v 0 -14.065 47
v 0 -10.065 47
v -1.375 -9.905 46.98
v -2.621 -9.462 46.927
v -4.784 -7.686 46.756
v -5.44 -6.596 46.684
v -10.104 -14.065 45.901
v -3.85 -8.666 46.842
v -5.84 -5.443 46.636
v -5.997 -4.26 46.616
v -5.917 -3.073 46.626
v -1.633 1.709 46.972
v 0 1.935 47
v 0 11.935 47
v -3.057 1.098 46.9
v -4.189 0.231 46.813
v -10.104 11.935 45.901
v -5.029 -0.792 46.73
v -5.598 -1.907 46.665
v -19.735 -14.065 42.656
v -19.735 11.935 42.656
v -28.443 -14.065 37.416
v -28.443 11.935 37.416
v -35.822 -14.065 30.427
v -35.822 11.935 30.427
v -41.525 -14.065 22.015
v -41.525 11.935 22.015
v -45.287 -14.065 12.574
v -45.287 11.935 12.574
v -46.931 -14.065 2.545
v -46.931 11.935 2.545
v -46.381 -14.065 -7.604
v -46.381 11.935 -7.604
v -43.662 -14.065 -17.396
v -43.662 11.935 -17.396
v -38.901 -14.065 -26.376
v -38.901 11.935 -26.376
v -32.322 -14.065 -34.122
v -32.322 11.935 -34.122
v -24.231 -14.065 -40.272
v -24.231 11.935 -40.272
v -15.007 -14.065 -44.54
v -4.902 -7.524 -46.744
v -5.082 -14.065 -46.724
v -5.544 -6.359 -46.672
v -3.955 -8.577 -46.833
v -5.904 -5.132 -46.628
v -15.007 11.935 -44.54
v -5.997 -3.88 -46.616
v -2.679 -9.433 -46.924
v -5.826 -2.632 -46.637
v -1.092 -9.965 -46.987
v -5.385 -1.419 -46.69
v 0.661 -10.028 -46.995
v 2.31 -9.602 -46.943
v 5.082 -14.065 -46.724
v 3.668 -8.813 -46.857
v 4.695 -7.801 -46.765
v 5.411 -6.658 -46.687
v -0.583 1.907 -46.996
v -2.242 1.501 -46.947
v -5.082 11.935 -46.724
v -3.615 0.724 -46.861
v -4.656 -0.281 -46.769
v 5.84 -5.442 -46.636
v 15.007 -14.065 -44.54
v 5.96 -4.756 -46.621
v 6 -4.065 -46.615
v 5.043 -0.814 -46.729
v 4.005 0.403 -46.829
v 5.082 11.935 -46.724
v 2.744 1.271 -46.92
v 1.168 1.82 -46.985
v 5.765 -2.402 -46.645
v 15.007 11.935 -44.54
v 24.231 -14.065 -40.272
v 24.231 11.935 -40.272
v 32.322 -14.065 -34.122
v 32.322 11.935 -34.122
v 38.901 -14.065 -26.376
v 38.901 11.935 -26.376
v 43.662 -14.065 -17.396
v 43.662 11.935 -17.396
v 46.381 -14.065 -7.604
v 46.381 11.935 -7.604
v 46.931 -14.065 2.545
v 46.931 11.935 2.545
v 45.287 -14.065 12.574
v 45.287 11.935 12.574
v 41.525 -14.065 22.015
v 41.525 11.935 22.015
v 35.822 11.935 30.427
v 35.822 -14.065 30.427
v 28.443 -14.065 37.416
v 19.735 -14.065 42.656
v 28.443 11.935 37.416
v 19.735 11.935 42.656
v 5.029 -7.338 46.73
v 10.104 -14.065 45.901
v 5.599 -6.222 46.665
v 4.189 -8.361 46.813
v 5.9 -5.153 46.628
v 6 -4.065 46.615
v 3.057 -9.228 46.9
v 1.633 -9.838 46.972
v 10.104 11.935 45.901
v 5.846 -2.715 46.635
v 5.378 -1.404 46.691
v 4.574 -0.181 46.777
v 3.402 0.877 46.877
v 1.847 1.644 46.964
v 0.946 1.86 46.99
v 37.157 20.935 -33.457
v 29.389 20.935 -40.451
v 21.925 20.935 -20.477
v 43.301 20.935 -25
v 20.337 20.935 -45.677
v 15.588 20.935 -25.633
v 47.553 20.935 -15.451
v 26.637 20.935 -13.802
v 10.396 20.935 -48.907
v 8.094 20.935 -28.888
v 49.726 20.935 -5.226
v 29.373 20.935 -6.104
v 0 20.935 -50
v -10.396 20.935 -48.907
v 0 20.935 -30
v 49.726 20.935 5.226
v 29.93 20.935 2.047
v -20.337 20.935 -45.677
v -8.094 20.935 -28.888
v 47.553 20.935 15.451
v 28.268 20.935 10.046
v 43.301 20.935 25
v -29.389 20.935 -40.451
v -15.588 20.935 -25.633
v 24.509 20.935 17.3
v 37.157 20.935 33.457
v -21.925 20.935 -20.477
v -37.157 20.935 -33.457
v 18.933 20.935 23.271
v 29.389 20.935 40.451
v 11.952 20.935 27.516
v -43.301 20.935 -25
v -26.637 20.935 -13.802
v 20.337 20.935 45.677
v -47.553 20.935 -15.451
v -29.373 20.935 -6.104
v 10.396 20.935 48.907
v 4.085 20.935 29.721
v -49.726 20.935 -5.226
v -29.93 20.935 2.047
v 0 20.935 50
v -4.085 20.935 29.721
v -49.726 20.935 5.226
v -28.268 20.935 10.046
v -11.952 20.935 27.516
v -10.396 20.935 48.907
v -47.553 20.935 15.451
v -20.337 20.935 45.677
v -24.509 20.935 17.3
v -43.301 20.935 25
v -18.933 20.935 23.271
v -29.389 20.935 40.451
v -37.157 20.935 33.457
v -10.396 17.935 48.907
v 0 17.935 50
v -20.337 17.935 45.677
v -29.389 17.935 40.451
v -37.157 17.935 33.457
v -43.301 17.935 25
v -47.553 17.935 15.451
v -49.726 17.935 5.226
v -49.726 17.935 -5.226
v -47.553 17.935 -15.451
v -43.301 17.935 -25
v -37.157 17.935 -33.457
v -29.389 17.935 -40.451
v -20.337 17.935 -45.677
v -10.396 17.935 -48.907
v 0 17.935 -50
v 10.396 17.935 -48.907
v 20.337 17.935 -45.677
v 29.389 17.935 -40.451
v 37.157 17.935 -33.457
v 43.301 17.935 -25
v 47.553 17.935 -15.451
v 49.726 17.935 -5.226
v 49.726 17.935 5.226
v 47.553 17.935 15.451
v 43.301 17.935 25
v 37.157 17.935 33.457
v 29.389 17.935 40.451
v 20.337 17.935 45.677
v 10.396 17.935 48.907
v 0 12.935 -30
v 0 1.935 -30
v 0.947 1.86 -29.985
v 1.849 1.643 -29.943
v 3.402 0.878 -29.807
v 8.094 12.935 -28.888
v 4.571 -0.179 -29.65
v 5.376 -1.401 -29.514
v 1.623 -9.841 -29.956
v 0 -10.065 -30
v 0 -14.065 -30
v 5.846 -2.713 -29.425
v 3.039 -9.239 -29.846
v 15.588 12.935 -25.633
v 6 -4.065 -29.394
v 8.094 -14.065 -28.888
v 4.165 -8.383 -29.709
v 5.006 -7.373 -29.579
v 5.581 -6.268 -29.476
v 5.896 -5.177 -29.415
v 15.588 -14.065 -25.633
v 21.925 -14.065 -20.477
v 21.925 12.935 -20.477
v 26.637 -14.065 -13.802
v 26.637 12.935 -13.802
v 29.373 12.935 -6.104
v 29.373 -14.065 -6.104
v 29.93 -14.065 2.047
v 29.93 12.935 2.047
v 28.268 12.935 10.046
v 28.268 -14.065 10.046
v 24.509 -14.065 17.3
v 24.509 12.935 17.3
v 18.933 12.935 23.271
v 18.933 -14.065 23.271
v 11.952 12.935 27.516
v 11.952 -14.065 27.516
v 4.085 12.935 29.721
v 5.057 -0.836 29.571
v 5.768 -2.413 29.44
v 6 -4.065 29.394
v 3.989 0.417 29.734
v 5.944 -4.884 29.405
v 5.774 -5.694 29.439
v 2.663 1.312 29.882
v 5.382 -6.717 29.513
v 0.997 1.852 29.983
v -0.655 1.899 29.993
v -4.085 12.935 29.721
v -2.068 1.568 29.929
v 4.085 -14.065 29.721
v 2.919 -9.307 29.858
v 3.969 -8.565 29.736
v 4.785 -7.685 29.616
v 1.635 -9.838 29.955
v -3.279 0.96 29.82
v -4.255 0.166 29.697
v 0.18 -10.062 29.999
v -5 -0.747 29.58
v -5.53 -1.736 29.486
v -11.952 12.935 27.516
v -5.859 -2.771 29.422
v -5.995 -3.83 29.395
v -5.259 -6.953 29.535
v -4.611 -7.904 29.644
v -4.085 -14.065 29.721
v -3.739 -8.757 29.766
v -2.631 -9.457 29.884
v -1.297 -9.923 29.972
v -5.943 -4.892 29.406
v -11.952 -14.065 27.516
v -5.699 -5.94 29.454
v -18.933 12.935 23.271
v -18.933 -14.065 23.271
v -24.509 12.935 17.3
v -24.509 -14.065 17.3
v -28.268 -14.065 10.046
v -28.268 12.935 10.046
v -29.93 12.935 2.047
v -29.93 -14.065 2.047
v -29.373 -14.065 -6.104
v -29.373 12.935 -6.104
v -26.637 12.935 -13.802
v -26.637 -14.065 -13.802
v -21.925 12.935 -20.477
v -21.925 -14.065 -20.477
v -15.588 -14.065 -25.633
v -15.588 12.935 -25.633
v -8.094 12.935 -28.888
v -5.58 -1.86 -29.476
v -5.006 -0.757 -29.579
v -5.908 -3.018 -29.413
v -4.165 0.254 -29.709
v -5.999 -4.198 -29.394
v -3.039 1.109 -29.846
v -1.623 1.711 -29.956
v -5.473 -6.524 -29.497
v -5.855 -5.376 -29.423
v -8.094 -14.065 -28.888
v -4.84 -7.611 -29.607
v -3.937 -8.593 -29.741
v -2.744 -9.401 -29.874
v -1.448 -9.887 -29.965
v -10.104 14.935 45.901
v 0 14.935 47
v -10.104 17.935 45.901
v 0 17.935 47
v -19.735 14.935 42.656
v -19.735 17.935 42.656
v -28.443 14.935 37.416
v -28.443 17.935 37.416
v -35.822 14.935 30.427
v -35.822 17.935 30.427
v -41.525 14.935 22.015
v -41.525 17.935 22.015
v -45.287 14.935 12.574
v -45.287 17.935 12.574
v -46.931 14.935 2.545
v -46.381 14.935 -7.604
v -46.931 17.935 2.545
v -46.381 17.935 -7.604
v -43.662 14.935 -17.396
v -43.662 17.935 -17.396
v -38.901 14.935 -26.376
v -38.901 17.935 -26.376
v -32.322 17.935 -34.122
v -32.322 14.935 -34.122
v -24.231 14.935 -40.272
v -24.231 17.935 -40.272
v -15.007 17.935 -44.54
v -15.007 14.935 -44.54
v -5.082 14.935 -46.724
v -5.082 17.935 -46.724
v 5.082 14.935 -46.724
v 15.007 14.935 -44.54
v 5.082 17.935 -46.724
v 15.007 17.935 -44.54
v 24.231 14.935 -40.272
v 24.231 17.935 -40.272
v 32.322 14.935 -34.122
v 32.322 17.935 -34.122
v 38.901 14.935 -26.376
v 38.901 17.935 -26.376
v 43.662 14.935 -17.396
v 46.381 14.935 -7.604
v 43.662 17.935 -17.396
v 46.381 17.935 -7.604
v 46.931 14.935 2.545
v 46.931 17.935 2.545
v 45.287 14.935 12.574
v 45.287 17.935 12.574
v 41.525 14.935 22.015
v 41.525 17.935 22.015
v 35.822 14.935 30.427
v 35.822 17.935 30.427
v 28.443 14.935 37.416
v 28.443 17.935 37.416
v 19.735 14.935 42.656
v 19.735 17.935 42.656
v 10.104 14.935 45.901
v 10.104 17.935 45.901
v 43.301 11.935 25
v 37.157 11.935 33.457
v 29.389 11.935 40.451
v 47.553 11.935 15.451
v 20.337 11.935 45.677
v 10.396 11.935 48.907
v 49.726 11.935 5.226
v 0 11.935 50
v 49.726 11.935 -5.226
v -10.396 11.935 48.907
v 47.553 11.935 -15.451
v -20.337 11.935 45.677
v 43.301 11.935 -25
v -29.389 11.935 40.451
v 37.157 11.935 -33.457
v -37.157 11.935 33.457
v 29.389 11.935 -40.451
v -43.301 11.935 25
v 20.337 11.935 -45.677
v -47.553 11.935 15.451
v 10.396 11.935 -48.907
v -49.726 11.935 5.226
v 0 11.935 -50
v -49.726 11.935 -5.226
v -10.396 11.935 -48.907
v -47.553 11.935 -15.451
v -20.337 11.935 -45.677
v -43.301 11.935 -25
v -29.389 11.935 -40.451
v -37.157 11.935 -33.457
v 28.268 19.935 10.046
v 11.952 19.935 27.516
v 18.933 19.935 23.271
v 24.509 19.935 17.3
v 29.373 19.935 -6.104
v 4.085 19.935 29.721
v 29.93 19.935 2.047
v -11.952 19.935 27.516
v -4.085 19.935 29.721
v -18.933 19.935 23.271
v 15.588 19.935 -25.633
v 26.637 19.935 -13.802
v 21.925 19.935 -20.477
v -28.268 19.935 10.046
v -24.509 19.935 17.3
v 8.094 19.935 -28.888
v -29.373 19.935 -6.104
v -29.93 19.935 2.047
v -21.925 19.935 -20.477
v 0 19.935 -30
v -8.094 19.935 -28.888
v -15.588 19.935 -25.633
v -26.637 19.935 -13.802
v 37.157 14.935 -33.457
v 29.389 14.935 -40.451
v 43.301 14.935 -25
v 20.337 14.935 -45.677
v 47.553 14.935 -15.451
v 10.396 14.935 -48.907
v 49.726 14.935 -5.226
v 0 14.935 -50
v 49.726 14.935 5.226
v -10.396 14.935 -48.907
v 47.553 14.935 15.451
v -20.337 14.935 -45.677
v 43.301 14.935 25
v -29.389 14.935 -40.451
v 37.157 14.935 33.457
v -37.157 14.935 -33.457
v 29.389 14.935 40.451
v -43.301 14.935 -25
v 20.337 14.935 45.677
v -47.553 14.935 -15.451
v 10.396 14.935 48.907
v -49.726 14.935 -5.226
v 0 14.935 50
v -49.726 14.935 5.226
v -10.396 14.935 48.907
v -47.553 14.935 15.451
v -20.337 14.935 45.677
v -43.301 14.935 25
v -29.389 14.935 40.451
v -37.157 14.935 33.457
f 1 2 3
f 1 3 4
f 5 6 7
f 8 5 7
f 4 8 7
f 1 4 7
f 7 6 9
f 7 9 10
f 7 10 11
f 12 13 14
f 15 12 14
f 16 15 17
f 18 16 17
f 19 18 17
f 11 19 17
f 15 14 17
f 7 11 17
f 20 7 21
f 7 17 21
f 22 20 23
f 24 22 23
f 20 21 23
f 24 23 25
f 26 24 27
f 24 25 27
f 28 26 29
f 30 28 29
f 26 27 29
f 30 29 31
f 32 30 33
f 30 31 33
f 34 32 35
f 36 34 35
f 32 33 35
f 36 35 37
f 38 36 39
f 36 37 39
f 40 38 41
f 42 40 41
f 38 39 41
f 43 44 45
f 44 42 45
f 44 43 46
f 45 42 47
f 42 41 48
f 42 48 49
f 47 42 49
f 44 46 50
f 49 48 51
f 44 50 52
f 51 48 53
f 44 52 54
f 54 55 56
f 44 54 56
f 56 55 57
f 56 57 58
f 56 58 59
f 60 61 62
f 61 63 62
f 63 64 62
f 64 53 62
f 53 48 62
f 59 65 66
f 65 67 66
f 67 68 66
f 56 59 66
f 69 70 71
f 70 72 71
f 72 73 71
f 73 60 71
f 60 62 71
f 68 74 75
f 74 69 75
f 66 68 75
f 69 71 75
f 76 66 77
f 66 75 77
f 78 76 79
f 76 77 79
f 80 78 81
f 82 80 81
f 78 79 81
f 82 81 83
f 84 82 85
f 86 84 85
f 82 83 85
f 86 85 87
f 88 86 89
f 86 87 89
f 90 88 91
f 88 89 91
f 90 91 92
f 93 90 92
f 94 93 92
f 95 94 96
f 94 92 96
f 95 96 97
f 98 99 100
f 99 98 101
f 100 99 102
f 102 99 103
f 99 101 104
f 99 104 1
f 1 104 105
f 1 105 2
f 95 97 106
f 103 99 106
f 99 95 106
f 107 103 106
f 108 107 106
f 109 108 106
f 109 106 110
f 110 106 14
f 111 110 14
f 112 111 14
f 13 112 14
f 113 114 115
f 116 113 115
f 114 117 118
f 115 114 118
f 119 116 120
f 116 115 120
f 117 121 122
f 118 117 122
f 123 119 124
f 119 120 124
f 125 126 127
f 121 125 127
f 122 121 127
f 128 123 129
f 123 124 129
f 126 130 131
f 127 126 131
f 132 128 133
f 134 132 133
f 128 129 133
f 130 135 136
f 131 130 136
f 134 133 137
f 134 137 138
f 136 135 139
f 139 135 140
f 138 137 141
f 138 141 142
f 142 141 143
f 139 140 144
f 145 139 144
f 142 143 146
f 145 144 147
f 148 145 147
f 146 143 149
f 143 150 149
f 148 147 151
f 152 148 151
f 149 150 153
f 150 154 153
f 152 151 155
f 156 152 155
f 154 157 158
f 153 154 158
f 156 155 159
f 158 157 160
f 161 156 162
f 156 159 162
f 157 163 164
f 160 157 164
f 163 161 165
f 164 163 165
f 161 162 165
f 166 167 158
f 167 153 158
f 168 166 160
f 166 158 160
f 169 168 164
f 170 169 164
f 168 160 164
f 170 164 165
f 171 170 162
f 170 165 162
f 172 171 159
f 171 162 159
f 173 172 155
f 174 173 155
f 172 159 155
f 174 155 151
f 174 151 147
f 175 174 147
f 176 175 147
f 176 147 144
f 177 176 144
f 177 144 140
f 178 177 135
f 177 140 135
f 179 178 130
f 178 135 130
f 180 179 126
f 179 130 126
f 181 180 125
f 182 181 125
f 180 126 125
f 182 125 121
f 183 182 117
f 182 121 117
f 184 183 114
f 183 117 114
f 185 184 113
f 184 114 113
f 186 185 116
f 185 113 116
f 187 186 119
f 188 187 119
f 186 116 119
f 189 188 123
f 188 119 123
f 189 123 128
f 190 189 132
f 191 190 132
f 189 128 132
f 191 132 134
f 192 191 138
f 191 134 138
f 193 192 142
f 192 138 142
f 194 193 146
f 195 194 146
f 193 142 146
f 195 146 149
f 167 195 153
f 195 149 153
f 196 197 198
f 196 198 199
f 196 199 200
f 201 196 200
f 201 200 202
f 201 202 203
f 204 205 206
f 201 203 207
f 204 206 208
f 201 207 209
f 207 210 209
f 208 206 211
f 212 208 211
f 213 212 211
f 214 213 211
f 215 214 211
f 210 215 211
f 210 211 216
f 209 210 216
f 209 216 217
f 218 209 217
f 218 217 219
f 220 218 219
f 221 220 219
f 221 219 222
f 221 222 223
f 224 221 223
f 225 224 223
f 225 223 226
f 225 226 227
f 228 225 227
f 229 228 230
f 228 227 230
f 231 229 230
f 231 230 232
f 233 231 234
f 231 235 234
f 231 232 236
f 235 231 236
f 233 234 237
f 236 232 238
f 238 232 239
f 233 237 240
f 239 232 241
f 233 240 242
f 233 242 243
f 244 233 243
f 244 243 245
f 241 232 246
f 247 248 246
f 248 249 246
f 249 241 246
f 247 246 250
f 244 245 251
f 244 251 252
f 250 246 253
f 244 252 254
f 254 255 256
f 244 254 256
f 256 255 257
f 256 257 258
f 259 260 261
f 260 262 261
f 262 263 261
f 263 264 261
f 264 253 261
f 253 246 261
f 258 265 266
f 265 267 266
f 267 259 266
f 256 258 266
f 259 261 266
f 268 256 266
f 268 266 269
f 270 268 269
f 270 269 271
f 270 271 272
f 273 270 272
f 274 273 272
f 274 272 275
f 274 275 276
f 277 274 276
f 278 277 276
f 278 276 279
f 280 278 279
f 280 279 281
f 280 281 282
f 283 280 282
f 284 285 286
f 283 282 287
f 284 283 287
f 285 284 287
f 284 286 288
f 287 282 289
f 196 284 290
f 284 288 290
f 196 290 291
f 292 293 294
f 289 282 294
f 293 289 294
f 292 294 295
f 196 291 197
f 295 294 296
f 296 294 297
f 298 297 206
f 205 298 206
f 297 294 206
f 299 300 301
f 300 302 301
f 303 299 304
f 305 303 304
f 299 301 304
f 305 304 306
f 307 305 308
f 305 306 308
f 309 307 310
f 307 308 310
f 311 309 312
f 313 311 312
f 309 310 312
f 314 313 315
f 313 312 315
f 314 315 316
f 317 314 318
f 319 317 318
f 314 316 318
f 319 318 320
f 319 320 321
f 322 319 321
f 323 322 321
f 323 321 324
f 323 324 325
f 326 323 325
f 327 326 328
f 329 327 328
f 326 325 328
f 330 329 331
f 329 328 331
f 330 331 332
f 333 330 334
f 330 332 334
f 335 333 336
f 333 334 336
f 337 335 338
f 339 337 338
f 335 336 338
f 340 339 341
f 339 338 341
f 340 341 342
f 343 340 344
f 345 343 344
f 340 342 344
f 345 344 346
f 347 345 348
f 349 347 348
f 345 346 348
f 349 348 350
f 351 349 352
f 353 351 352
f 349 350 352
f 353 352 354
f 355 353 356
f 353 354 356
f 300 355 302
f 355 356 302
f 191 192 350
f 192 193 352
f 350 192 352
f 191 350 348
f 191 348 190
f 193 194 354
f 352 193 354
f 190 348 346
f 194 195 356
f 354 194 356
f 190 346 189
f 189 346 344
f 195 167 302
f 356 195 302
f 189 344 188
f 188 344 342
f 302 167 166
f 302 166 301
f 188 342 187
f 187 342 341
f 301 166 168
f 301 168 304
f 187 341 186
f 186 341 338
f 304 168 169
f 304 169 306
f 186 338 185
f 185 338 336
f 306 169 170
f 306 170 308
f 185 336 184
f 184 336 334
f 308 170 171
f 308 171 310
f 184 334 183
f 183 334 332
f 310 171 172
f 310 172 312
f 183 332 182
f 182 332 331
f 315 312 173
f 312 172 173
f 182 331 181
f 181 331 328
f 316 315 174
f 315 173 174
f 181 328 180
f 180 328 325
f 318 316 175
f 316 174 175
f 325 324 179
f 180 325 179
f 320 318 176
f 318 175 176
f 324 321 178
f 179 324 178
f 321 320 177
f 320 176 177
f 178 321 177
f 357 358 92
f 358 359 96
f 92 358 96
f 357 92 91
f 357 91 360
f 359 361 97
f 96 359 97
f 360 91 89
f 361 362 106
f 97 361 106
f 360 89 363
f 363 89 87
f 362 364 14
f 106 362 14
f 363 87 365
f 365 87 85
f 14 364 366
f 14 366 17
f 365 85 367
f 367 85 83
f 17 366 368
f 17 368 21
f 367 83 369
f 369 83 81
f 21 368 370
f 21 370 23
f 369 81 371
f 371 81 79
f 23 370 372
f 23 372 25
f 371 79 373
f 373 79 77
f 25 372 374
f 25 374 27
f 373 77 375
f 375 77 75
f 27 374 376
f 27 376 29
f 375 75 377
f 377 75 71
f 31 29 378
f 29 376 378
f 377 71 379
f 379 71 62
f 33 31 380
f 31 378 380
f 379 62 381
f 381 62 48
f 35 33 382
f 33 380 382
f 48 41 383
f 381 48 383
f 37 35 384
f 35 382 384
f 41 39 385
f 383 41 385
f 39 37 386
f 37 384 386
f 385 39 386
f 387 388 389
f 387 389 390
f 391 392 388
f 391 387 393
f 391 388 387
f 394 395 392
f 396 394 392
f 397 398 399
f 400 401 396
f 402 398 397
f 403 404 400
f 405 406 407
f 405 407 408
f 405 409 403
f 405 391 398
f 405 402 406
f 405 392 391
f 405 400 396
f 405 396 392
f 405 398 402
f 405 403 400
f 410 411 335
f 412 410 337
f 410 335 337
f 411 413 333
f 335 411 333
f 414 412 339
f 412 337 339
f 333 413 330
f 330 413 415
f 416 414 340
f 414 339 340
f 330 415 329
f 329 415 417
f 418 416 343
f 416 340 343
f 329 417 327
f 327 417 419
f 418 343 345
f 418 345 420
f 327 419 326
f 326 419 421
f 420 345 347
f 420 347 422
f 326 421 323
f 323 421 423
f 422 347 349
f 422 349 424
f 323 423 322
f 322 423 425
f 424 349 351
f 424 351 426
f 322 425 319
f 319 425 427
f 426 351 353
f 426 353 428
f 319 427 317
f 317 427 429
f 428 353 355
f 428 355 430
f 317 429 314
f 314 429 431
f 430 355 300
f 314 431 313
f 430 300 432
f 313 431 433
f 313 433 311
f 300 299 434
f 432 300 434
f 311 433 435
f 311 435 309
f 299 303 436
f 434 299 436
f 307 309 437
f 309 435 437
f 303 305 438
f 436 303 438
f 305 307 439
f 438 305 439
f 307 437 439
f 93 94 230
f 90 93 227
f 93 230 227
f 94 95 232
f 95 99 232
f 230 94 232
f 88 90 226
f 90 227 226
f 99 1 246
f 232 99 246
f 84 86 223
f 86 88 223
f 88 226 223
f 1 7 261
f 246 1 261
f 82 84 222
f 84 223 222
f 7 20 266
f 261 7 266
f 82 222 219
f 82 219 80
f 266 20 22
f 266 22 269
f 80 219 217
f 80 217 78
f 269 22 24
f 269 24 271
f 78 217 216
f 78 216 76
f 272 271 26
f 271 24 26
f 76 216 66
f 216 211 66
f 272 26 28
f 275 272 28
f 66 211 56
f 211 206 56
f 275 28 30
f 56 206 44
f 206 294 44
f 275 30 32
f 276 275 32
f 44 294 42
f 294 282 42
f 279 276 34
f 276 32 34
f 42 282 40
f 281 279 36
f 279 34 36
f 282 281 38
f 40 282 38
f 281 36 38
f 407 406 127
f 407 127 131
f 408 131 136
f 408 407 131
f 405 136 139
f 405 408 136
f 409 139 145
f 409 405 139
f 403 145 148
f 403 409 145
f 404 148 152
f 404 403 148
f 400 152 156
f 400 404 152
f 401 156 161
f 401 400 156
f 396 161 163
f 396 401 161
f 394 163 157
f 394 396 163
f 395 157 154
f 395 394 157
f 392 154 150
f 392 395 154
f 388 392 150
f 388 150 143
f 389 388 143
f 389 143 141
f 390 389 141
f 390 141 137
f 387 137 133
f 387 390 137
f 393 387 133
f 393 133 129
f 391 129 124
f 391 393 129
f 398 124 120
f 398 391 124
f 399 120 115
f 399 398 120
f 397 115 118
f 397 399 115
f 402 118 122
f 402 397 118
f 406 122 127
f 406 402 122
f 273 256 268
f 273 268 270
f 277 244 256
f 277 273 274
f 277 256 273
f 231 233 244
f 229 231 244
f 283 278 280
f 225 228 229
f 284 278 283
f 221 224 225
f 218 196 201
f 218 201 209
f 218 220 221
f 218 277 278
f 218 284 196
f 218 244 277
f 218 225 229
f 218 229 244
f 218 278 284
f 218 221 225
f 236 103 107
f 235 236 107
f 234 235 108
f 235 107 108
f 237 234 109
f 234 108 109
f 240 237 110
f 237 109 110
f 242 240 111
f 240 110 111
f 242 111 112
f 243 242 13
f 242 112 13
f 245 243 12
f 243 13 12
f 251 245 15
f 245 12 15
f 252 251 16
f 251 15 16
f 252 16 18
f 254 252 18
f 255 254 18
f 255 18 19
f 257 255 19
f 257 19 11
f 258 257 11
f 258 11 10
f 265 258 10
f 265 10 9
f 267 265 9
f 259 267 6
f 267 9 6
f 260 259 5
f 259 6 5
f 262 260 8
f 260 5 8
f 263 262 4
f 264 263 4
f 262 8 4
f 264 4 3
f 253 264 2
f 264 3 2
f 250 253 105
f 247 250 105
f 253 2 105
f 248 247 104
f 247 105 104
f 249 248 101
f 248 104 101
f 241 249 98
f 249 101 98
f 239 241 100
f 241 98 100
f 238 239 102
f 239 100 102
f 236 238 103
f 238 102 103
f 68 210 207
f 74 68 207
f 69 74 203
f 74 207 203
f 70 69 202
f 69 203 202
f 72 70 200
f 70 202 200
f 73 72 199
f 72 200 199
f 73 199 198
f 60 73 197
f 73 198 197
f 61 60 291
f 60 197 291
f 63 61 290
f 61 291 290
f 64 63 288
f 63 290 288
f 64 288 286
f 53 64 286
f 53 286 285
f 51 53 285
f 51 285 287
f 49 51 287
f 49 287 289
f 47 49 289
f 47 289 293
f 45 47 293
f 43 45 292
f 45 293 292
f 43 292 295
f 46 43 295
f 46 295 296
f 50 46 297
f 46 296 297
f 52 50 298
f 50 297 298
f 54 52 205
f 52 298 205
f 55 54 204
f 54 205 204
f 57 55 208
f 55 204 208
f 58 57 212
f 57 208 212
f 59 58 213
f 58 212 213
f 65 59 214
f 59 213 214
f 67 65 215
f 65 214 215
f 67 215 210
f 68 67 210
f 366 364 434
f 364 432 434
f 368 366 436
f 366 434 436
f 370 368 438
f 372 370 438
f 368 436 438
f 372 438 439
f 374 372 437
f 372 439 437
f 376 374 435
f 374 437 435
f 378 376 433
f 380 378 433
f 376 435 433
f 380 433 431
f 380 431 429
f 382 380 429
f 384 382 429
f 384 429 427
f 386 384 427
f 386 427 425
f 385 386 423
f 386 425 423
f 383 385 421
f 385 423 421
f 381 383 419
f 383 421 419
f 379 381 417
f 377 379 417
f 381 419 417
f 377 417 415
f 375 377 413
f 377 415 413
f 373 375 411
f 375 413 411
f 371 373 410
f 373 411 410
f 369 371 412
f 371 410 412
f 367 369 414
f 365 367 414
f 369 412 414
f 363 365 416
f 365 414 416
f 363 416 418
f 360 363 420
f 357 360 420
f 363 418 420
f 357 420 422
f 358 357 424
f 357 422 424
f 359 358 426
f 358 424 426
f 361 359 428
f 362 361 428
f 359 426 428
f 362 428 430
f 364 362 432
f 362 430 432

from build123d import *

# Parameters (mm, degrees)
SKETCH3_R          = 30
CUT_EXTRUDE1_DEPTH = 27
SKETCH4_R          = 6
CUT_EXTRUDE2_DEPTH = 112.118324226
CUT_EXTRUDE3_START = -1
SKETCH5_R          = 30
CUT_EXTRUDE3_DEPTH = 1


with BuildPart() as part:
    # Sketch2 → Revolve1 (revolve)
    with BuildSketch(Plane.XY, mode=Mode.PRIVATE) as revolve1_sk:
        Polygon((0, -14.064814815), (47, -14.064814815), (47, 11.935185185), (50, 11.935185185), (50, 14.935185185), (47, 14.935185185), (47, 17.935185185), (50, 17.935185185), (50, 20.935185185), (0, 20.935185185), align=None)
    revolve(revolve1_sk.sketch.rotate(Axis((0, 20.935185185, 0), (0, -1, 0)), 90), axis=Axis((0, 20.935185185, 0), (0, -1, 0)))

    # Sketch3 → Cut-Extrude1 (cut)
    with BuildSketch(Plane.XZ.offset(14.064814815)):
        with Locations(Location((0, 0, 0), (0, 0, 270))):
            Circle(SKETCH3_R)
    extrude(amount=-CUT_EXTRUDE1_DEPTH, mode=Mode.SUBTRACT)

    # Sketch4 → Cut-Extrude2 (cut, through all)
    with BuildSketch(Plane.XY.offset(47)):
        with Locations((0, -4.064814815)):
            Circle(SKETCH4_R)
    extrude(amount=-CUT_EXTRUDE2_DEPTH, mode=Mode.SUBTRACT)

    # Sketch5 → Cut-Extrude3 (cut)
    with BuildSketch(Plane(origin=(0, 20.935185185, 0), x_dir=(1, 0, 0), z_dir=(0, 1, 0)).offset(CUT_EXTRUDE3_START)):
        with Locations(Location((0, 0, 0), (0, 0, 90))):
            Circle(SKETCH5_R)
    extrude(amount=CUT_EXTRUDE3_DEPTH, mode=Mode.SUBTRACT)


solid = part.part
